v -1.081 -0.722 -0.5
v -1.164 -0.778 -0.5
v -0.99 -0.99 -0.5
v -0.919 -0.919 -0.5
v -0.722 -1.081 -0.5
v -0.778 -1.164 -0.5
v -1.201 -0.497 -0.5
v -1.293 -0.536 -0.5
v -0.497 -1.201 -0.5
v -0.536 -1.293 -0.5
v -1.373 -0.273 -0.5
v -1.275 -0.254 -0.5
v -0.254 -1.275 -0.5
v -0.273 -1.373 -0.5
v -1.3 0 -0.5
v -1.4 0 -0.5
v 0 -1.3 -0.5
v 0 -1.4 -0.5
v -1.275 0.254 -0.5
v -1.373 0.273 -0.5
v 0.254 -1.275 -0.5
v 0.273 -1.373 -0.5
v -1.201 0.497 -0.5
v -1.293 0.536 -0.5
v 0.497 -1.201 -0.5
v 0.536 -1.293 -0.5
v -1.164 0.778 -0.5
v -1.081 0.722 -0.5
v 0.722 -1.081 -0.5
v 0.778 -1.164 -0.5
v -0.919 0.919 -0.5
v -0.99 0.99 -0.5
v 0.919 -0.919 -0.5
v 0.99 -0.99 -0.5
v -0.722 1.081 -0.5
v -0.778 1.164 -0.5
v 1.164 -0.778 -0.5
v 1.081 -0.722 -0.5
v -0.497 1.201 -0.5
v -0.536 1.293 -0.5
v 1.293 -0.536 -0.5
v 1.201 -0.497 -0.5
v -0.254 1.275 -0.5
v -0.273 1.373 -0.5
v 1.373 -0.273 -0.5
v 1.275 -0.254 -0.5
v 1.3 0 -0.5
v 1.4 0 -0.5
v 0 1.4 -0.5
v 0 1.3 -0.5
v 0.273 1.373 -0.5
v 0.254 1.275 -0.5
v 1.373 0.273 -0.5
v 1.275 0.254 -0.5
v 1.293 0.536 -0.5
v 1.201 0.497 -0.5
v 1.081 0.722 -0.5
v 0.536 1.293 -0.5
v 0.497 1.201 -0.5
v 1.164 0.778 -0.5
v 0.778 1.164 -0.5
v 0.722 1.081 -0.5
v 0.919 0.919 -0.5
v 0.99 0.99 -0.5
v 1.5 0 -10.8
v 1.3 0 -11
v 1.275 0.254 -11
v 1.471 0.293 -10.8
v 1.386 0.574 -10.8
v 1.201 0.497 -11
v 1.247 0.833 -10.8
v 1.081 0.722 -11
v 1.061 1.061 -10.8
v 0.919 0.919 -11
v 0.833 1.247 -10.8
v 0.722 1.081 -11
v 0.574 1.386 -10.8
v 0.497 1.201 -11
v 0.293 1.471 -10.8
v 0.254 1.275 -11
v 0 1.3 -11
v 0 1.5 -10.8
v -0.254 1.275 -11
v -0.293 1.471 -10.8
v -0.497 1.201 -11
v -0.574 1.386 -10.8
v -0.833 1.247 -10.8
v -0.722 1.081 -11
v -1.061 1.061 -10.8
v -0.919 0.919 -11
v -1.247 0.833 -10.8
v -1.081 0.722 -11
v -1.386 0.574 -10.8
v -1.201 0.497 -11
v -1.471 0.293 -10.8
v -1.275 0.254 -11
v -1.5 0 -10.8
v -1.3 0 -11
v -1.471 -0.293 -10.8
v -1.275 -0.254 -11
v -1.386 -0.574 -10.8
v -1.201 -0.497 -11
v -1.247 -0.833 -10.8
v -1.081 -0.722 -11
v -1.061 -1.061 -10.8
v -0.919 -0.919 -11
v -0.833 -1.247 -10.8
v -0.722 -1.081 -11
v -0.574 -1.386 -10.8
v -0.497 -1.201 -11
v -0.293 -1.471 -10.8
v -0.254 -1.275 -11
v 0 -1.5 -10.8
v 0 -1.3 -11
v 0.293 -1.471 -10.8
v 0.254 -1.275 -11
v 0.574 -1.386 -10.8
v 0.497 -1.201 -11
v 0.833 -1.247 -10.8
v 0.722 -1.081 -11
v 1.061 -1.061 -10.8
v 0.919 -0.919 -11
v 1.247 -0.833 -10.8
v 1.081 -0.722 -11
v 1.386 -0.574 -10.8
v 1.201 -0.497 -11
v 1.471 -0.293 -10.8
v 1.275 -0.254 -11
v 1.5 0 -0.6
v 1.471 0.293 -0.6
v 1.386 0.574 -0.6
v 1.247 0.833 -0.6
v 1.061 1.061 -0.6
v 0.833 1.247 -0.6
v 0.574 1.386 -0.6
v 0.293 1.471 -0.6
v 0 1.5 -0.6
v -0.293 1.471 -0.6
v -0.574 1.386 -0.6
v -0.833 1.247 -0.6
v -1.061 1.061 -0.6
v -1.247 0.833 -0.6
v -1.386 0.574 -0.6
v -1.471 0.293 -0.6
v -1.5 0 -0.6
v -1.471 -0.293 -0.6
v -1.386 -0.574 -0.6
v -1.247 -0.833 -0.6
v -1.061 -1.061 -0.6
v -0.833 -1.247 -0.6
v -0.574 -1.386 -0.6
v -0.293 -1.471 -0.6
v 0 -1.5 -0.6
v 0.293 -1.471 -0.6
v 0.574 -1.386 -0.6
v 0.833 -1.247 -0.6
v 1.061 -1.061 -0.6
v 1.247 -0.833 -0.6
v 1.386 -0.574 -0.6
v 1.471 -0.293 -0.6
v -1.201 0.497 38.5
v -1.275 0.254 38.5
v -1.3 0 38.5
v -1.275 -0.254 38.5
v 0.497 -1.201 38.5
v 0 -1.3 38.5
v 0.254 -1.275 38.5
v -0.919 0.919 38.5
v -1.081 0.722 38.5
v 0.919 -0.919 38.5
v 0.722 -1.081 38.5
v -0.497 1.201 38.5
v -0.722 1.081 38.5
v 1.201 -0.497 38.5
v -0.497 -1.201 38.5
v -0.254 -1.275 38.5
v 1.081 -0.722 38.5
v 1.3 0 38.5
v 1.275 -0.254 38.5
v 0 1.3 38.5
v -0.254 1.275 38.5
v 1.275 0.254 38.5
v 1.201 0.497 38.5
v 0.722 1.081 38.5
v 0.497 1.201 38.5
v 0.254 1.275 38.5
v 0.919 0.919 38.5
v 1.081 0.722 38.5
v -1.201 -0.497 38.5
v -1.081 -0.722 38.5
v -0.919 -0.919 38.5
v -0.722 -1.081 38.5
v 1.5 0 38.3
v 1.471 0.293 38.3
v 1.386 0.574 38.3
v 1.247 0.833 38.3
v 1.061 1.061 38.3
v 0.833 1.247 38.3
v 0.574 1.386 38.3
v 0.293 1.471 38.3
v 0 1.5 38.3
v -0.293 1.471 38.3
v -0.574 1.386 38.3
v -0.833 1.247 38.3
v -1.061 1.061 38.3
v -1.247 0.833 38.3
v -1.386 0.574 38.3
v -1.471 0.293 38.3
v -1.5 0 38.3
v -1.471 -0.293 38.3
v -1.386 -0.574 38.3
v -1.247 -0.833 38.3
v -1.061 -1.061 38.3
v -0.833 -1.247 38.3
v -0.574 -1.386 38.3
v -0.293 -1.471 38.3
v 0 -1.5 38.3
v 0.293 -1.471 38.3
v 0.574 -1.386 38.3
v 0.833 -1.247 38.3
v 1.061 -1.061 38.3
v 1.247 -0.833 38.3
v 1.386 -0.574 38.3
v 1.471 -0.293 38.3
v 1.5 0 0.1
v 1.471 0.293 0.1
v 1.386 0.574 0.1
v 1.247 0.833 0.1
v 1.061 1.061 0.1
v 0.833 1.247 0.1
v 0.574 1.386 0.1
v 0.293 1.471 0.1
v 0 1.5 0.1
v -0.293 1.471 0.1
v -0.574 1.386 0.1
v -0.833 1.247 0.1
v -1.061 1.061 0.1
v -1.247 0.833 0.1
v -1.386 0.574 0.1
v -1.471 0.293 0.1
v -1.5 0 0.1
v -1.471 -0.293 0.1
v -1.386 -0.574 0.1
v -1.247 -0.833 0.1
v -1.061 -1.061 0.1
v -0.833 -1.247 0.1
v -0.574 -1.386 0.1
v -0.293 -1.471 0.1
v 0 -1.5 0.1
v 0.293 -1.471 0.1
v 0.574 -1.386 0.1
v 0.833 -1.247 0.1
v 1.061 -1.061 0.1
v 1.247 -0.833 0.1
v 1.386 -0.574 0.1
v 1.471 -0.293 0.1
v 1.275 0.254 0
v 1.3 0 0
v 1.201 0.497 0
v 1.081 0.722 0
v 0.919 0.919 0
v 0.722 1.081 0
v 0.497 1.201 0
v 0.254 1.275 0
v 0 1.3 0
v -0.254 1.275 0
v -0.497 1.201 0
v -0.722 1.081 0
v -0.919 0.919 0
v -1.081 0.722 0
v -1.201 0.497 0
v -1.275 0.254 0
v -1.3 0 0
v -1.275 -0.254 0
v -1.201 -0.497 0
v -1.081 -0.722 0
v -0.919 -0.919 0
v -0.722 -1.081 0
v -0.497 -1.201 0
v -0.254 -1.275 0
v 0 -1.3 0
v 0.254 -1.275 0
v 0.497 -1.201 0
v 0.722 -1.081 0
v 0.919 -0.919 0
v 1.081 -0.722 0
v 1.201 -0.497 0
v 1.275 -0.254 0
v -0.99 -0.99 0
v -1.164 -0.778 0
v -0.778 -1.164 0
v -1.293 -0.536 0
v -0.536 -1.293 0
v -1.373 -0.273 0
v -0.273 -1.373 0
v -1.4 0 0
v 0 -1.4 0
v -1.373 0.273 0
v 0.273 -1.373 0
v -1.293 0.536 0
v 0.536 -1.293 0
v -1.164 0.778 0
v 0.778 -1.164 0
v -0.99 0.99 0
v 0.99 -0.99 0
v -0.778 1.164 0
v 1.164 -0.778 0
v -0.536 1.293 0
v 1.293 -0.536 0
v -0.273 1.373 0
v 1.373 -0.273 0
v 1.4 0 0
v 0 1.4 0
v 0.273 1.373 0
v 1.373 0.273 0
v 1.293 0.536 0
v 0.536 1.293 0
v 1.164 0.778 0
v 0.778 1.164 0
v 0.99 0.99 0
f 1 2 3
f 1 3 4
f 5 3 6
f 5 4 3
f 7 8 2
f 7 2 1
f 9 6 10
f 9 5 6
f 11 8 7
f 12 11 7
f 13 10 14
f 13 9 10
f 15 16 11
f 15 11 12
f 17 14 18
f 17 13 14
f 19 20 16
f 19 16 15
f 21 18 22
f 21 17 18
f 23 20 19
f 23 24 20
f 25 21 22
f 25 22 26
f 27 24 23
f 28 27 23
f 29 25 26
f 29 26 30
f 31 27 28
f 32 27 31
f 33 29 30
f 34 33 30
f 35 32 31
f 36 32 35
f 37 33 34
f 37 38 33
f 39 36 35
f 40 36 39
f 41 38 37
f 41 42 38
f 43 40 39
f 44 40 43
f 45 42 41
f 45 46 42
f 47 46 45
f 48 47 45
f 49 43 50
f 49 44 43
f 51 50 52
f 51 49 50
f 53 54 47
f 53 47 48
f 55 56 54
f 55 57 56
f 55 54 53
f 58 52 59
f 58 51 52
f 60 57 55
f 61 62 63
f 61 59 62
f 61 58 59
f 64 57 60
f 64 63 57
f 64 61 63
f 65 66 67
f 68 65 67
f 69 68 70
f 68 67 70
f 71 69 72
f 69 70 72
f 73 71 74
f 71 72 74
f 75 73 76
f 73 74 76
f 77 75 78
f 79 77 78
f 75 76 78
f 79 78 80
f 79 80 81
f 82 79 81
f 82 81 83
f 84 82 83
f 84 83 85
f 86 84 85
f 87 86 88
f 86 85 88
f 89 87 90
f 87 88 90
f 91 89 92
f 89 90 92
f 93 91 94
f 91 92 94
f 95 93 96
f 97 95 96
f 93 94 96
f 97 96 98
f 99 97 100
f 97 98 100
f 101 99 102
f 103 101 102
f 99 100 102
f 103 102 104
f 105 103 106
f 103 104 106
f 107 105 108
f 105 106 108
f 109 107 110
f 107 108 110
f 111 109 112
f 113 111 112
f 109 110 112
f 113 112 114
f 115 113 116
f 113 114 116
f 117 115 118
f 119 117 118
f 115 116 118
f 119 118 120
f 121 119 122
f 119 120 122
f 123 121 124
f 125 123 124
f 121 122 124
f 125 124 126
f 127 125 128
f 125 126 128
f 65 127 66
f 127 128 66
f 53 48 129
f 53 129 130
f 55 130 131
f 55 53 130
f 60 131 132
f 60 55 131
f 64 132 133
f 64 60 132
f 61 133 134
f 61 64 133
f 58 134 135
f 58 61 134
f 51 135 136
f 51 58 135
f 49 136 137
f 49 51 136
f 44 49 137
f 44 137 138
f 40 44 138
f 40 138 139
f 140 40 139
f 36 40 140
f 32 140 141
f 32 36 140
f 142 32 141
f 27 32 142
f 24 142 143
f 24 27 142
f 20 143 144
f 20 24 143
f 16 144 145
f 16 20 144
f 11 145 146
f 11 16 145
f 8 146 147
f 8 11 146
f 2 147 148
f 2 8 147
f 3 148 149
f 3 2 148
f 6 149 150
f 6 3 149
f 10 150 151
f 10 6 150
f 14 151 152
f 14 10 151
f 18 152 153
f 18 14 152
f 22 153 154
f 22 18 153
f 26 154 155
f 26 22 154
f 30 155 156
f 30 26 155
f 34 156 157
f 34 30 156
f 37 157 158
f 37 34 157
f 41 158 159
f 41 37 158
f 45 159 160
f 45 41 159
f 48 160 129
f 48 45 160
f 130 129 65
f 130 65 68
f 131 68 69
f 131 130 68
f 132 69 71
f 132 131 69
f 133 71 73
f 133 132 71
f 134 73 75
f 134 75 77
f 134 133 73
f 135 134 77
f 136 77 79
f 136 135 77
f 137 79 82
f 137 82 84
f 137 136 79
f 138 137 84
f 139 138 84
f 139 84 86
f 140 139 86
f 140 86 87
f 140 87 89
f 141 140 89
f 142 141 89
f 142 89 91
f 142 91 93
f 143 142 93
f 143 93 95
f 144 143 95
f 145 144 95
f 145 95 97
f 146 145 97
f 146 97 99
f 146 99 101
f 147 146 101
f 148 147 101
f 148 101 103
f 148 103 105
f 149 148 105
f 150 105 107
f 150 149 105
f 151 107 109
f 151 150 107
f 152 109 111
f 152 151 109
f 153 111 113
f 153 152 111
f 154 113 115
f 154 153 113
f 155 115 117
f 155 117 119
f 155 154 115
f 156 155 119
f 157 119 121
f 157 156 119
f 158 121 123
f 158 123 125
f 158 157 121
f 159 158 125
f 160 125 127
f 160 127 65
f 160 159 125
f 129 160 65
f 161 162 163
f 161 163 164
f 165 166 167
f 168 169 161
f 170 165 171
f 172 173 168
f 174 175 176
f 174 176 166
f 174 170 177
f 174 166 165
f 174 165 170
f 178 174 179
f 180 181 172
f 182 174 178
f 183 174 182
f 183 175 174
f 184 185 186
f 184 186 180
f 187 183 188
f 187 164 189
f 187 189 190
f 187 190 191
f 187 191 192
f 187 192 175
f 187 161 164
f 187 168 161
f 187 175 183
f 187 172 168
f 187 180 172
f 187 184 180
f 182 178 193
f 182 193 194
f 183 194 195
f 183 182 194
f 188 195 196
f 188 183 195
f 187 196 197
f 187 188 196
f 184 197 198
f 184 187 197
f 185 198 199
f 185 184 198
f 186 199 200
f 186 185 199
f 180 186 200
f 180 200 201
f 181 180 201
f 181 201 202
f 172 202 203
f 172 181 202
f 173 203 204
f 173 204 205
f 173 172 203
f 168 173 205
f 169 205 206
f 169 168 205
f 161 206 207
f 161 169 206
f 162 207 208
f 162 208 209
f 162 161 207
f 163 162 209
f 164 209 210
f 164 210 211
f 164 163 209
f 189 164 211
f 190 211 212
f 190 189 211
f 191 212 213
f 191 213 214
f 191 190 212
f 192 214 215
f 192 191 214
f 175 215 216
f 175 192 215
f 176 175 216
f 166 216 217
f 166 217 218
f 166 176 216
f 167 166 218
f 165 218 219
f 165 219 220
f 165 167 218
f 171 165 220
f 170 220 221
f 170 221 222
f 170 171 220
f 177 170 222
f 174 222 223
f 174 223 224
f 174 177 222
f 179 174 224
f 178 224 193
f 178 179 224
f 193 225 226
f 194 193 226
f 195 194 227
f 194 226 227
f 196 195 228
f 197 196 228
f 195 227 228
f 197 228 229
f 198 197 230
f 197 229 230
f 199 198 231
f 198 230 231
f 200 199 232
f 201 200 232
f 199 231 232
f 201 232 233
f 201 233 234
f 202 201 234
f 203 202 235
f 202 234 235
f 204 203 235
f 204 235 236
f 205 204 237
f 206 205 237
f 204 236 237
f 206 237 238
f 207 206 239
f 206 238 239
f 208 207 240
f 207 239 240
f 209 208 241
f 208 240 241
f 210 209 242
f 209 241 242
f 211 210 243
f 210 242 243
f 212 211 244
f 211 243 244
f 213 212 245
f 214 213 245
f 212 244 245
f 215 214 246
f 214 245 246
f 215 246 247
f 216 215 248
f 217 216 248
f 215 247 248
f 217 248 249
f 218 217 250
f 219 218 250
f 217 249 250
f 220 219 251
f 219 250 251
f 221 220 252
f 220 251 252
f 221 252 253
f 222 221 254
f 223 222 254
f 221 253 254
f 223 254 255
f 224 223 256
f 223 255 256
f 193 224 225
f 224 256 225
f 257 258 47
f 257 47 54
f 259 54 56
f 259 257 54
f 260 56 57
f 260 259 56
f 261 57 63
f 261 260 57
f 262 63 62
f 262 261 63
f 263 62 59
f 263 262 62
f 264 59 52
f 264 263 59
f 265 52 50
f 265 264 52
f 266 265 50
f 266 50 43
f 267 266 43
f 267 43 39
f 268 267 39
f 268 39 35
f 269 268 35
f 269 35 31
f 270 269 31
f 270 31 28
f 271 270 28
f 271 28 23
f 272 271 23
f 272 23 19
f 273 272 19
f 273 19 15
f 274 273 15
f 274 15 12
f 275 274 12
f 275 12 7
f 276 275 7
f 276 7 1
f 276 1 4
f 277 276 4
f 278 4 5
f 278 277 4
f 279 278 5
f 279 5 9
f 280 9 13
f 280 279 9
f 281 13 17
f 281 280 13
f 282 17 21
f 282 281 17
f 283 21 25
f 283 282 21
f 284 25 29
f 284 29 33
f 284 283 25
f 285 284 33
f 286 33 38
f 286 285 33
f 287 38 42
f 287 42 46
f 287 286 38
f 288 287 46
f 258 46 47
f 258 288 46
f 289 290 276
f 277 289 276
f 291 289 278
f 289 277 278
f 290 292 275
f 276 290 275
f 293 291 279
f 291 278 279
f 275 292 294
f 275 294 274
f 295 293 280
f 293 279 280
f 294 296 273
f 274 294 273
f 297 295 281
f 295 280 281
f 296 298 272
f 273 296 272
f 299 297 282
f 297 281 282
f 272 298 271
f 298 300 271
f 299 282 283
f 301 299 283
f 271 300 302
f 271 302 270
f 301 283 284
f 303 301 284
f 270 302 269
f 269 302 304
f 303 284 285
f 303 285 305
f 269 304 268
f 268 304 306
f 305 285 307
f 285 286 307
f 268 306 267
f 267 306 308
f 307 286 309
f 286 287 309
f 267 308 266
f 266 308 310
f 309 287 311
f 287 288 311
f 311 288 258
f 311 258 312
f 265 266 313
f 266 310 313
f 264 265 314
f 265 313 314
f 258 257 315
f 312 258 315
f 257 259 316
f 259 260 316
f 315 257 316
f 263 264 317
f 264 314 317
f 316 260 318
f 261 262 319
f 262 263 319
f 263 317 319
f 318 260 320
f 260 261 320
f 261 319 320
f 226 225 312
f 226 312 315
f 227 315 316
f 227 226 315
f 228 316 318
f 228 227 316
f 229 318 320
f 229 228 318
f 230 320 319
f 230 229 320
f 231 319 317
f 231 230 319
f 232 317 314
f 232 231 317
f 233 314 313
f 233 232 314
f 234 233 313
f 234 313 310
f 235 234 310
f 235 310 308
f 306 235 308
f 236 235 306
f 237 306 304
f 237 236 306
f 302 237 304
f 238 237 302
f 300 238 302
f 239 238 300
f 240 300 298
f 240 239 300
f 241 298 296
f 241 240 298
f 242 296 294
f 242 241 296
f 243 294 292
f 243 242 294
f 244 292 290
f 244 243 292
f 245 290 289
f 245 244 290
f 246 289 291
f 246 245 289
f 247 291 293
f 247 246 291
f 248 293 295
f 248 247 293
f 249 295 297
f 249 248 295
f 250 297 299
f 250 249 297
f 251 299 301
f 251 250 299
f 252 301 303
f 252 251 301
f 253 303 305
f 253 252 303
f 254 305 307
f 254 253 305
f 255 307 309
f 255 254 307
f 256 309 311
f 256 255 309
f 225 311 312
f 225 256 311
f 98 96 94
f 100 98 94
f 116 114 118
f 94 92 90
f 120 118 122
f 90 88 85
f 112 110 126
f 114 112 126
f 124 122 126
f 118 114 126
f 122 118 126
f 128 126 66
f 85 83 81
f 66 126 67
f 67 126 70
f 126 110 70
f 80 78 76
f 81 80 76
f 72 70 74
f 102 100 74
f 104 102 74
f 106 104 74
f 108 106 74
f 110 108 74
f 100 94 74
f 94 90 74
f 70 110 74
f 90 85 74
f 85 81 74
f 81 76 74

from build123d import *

# Parameters (mm, degrees)
F0_R     = 1.5
F0_R_2   = 1.3
F1_DEPTH = 38.5
F2_DEPTH = 1
F3_START = -0.5
F3_DEPTH = 0.5
F4_DEPTH = 10
F5_SIZE  = 0.2
F6_SIZE  = 0.1


with BuildPart() as f1:
    # F0 (on Top) → F1 (new body)
    with BuildSketch(Plane.XY):
        Circle(F0_R)
        Circle(F0_R_2, mode=Mode.SUBTRACT)
        Circle(F0_R_2)
    extrude(amount=F1_DEPTH)

    # F0 (on Top) → F2 (join)
    with BuildSketch(Plane.XY):
        Circle(F0_R_2)
    extrude(amount=-F2_DEPTH)

    # F0 (on Top) → F3 (join)
    with BuildSketch(Plane.XY.offset(F3_START)):
        Circle(F0_R)
        Circle(F0_R_2, mode=Mode.SUBTRACT)
    extrude(amount=-F3_DEPTH)

    # F4 (add): a face of the model
    f4_faces = [f1.faces().sort_by_distance(p)[0] for p in [
        (0, 0, -1),
    ]]
    extrude(f4_faces, amount=F4_DEPTH)

    # F5
    f5_edges = [f1.edges().sort_by_distance(p)[0] for p in [
        (-1.5, 0, 38.5),
        (-1.5, 0, -11),
    ]]
    chamfer(f5_edges, length=F5_SIZE)

    # F6
    f6_edges = [f1.edges().sort_by_distance(p)[0] for p in [
        (-1.5, 0, -0.5),
        (-1.5, 0, 0),
    ]]
    chamfer(f6_edges, length=F6_SIZE)


solid = f1.part
